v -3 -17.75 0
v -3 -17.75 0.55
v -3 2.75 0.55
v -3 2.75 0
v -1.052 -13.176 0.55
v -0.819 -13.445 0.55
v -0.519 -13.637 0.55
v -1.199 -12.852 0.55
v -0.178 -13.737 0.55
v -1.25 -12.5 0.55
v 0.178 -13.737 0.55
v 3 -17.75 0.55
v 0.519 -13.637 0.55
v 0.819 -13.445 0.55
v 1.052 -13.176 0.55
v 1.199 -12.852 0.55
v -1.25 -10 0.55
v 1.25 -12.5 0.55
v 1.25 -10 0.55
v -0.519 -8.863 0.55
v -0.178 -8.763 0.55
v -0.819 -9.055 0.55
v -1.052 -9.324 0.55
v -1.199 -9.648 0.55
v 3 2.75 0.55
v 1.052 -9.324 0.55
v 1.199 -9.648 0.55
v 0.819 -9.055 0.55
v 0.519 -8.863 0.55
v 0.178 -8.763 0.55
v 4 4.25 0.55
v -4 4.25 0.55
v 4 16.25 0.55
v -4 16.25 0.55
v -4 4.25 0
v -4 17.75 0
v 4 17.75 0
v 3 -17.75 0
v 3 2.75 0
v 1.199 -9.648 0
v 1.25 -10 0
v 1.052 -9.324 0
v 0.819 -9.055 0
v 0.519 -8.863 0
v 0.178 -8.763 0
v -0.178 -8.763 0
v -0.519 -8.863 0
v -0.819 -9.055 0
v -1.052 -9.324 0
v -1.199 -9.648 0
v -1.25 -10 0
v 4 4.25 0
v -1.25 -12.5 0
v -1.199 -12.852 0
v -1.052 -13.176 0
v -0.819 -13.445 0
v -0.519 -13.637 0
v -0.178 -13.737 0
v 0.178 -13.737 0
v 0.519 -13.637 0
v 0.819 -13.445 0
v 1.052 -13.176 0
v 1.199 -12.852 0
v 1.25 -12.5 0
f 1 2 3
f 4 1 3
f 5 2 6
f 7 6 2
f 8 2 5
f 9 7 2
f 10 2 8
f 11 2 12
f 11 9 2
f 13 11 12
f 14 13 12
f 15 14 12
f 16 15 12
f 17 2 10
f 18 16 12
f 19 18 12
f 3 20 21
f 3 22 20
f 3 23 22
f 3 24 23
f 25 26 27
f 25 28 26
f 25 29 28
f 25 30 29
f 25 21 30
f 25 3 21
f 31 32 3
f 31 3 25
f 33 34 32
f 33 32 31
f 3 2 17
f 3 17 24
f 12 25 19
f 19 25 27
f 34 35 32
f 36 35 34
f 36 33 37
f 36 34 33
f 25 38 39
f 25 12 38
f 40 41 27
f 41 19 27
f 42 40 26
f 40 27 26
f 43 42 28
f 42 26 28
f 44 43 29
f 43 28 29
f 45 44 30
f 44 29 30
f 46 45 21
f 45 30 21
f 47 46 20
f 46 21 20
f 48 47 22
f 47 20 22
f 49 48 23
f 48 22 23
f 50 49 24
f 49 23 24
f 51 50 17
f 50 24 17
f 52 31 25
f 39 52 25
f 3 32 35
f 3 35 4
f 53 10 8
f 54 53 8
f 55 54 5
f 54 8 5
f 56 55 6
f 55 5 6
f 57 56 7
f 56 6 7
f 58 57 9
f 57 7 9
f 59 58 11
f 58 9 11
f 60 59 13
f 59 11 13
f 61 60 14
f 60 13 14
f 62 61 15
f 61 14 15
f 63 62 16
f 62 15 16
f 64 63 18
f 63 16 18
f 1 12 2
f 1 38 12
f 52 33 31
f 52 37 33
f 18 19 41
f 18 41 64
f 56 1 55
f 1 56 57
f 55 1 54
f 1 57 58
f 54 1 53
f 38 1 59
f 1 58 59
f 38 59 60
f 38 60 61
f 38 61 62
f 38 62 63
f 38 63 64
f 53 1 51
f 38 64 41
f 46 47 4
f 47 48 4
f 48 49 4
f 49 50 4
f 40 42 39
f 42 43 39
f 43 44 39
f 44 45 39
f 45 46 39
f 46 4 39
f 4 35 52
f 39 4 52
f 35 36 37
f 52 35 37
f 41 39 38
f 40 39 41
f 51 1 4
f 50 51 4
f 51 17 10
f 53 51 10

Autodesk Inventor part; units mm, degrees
ref_plane "YZ Plane" through (0, 0, 0) normal (1, 0, 0) x (0, 1, 0)
ref_plane "XZ Plane" through (0, 0, 0) normal (0, 1, 0) x (-1, 0, 0)
ref_plane "XY Plane" through (0, 0, 0) normal (0, 0, 1) x (1, 0, 0)
sketch "スケッチ1" plane through (0, 0, 0) normal (0, 0, 1) x (1, 0, 0)
  line L0 (-4, 17.75) -> (4, 17.75)
  line L1 (4, 17.75) -> (4, -17.75)
  line L2 (4, -17.75) -> (-4, -17.75)
  line L3 (-4, -17.75) -> (-4, 17.75)
  line L4 (-4, 17.75) -> (4, -17.75) construction
  line L5 (4, 17.75) -> (-4, -17.75) construction
  point P0 (0, 0)
  dimension "d0" = 8
  dimension "d1" = 35.5
extrude "押し出し1" add sketch "スケッチ1" along normal blind 0.55
sketch "スケッチ2" plane through (0, 0, 0.55) normal (0, 0, 1) x (1, 0, 0)
  line L0 (-4, -17.75) -> (4, -17.75) projected
  line L1 (3, -17.75) -> (3, 2.75)
  line L2 (4, -17.75) -> (4, 17.75) projected
  line L3 (3, -17.75) -> (23.5, -17.75) construction
  line L4 (0, -17.75) -> (-3, -17.75)
  line L5 (-3, -17.75) -> (-3, 2.75)
  line L6 (-4, 17.75) -> (-4, -17.75) projected
  line L7 (-4, 4.25) -> (-3, 2.75)
  line L8 (-4, 4.25) -> (-4, -17.75)
  line L9 (-4, -17.75) -> (-3, -17.75)
  line L10 (4, 4.25) -> (3, 2.75)
  line L11 (4, 4.25) -> (4, -17.75)
  line L12 (3, -17.75) -> (4, -17.75)
  point P0 (0, 0)
  dimension "d4" = 20.5
  dimension "d5" = 90
  dimension "d6" = 3
extrude "押し出し2" cut sketch "スケッチ2" against normal blind 0.55
sketch "スケッチ3" plane through (0, 0, 0.55) normal (0, 0, 1) x (1, 0, 0)
  circle A0 centre (0, -12.5) radius 1.25
  circle A1 centre (0, -10) radius 1.25
  line L0 (1.25, -10) -> (1.25, -12.5)
  line L1 (-1.25, -10) -> (-1.25, -12.5)
  point P0 (0, 0)
  dimension "d9" = 2.5
extrude "押し出し3" cut sketch "スケッチ3" against normal blind 10
sketch "スケッチ4" plane through (-4, 17.75, 0) normal (-1, 0, 0) x (0, 0, 1)
  line L0 (0.55, 0) -> (0.55, -13.5) projected
  line L1 (0.55, 0) -> (0.55, -1.5)
  line L2 (0, -13.5) -> (0, 0) projected
  line L3 (0.55, -1.5) -> (0, 0)
  line L4 (0, 0) -> (0.55, 0)
  point P0 (0, -17.75)
  dimension "d12" = 1.5
extrude "押し出し4" cut sketch "スケッチ4" against normal blind 10
properties part number "pen_type_cutter_realsize" material "鋼、合金鋼"
